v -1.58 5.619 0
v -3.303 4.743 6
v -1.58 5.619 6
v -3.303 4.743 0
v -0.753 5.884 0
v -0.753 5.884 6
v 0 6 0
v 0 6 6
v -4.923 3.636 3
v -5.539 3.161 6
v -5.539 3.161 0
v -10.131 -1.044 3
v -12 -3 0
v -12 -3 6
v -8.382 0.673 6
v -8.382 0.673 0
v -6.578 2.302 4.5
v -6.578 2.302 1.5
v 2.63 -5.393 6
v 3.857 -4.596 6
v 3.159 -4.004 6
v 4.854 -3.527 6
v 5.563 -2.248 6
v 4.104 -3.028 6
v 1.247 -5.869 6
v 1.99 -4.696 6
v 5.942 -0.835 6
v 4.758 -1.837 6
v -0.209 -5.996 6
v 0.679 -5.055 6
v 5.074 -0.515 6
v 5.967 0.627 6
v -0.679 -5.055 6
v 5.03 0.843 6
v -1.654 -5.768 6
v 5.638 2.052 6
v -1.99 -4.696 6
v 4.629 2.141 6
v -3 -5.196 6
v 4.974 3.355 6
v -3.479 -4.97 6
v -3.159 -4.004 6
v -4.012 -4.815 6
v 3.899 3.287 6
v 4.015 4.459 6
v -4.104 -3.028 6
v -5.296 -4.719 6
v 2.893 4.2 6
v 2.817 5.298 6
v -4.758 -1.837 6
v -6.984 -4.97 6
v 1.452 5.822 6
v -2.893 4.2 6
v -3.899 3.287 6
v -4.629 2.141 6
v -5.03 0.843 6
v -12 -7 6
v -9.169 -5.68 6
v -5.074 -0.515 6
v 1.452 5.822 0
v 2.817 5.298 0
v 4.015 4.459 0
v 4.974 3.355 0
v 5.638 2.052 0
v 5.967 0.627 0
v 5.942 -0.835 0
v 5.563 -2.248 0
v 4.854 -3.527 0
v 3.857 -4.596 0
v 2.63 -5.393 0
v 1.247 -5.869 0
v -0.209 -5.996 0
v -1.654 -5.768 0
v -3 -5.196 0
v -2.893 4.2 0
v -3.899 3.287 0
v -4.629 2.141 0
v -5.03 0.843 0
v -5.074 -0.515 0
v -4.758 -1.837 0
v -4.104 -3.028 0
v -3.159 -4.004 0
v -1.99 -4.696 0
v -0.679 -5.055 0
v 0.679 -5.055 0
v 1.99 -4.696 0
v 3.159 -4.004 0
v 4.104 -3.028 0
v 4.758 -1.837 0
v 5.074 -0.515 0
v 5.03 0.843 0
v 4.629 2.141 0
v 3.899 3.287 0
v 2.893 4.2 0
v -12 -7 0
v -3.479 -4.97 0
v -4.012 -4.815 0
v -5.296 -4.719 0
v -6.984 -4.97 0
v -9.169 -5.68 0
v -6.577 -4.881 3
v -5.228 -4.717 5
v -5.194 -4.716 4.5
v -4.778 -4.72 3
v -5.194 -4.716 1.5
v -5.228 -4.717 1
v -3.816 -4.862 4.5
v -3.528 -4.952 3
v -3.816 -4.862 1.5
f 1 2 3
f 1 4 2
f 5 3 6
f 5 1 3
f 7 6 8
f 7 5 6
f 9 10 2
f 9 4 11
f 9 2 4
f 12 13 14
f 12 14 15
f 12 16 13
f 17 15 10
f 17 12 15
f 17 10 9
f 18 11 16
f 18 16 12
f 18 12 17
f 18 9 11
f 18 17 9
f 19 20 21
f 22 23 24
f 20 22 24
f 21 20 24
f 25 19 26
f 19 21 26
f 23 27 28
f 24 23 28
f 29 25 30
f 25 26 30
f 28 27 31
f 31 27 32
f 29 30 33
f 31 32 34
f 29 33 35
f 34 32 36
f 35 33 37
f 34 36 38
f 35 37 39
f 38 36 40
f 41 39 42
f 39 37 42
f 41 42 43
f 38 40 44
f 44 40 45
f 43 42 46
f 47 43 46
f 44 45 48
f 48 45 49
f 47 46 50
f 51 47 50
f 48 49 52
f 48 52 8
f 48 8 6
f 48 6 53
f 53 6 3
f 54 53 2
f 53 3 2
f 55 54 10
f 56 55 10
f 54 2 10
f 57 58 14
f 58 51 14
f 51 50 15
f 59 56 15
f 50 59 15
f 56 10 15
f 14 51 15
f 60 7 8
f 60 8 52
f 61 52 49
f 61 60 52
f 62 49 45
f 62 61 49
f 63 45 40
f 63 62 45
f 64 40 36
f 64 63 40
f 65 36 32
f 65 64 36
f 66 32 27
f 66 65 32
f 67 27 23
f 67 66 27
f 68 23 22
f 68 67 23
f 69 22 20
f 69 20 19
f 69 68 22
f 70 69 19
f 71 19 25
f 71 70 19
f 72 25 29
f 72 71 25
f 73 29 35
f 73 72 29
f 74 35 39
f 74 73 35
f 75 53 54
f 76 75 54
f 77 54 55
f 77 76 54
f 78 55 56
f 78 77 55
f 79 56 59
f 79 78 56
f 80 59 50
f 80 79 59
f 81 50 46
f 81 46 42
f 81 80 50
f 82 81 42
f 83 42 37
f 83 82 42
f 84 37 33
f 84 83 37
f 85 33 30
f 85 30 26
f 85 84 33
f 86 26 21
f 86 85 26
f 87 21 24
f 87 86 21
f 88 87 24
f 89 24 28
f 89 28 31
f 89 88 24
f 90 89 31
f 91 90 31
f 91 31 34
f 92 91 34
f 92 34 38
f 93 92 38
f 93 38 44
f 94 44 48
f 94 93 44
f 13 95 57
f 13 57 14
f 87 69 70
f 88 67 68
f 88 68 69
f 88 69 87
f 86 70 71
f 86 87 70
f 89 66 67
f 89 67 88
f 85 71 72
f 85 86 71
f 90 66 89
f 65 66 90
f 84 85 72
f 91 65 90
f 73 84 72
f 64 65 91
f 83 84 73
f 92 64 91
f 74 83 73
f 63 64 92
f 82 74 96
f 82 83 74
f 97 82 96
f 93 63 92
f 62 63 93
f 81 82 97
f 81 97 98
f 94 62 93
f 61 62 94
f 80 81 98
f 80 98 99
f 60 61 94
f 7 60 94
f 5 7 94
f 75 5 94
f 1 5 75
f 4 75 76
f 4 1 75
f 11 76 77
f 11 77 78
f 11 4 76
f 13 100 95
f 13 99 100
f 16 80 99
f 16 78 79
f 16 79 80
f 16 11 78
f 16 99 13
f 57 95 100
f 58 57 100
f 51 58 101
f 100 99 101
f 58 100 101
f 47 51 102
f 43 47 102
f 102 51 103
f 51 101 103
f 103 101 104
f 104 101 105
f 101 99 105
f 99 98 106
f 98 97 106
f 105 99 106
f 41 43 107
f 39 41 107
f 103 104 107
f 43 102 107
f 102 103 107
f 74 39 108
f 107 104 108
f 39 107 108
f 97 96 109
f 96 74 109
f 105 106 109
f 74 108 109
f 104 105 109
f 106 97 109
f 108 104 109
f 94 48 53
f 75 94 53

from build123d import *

# Parameters (mm, degrees)
AUFSATZ_LINEAR_AUSTRAGEN1_DEPTH = 6


with BuildPart() as part:
    # Skizze1 → Aufsatz-Linear austragen1 (new body)
    with BuildSketch(Plane.XY):
        with BuildLine():
            Line((-12, -7), (-12, -3))
            add(Edge.make_bspline(
                [(-12, -3), (-3.846414533, 5.771268296), (0, 6)],
                knots=[0, 0, 0, 0.663529029, 0.663529029, 0.663529029], degree=2))
            ThreePointArc((0, 6), (5.795554958, -1.552914271), (-3, -5.196152423))
            add(Edge.make_bspline(
                [(-12, -7), (-5.654241137, -3.663725588), (-3, -5.196152423)],
                knots=[0, 0, 0, 0.361848159, 0.361848159, 0.361848159], degree=2))
        make_face()
        with BuildLine():
            Line((2.893095228, 4.2), (-2.893095228, 4.2))
            ThreePointArc((-2.893095228, 4.2), (0, -5.1), (2.893095228, 4.2))
        make_face(mode=Mode.SUBTRACT)
    extrude(amount=AUFSATZ_LINEAR_AUSTRAGEN1_DEPTH)


solid = part.part
